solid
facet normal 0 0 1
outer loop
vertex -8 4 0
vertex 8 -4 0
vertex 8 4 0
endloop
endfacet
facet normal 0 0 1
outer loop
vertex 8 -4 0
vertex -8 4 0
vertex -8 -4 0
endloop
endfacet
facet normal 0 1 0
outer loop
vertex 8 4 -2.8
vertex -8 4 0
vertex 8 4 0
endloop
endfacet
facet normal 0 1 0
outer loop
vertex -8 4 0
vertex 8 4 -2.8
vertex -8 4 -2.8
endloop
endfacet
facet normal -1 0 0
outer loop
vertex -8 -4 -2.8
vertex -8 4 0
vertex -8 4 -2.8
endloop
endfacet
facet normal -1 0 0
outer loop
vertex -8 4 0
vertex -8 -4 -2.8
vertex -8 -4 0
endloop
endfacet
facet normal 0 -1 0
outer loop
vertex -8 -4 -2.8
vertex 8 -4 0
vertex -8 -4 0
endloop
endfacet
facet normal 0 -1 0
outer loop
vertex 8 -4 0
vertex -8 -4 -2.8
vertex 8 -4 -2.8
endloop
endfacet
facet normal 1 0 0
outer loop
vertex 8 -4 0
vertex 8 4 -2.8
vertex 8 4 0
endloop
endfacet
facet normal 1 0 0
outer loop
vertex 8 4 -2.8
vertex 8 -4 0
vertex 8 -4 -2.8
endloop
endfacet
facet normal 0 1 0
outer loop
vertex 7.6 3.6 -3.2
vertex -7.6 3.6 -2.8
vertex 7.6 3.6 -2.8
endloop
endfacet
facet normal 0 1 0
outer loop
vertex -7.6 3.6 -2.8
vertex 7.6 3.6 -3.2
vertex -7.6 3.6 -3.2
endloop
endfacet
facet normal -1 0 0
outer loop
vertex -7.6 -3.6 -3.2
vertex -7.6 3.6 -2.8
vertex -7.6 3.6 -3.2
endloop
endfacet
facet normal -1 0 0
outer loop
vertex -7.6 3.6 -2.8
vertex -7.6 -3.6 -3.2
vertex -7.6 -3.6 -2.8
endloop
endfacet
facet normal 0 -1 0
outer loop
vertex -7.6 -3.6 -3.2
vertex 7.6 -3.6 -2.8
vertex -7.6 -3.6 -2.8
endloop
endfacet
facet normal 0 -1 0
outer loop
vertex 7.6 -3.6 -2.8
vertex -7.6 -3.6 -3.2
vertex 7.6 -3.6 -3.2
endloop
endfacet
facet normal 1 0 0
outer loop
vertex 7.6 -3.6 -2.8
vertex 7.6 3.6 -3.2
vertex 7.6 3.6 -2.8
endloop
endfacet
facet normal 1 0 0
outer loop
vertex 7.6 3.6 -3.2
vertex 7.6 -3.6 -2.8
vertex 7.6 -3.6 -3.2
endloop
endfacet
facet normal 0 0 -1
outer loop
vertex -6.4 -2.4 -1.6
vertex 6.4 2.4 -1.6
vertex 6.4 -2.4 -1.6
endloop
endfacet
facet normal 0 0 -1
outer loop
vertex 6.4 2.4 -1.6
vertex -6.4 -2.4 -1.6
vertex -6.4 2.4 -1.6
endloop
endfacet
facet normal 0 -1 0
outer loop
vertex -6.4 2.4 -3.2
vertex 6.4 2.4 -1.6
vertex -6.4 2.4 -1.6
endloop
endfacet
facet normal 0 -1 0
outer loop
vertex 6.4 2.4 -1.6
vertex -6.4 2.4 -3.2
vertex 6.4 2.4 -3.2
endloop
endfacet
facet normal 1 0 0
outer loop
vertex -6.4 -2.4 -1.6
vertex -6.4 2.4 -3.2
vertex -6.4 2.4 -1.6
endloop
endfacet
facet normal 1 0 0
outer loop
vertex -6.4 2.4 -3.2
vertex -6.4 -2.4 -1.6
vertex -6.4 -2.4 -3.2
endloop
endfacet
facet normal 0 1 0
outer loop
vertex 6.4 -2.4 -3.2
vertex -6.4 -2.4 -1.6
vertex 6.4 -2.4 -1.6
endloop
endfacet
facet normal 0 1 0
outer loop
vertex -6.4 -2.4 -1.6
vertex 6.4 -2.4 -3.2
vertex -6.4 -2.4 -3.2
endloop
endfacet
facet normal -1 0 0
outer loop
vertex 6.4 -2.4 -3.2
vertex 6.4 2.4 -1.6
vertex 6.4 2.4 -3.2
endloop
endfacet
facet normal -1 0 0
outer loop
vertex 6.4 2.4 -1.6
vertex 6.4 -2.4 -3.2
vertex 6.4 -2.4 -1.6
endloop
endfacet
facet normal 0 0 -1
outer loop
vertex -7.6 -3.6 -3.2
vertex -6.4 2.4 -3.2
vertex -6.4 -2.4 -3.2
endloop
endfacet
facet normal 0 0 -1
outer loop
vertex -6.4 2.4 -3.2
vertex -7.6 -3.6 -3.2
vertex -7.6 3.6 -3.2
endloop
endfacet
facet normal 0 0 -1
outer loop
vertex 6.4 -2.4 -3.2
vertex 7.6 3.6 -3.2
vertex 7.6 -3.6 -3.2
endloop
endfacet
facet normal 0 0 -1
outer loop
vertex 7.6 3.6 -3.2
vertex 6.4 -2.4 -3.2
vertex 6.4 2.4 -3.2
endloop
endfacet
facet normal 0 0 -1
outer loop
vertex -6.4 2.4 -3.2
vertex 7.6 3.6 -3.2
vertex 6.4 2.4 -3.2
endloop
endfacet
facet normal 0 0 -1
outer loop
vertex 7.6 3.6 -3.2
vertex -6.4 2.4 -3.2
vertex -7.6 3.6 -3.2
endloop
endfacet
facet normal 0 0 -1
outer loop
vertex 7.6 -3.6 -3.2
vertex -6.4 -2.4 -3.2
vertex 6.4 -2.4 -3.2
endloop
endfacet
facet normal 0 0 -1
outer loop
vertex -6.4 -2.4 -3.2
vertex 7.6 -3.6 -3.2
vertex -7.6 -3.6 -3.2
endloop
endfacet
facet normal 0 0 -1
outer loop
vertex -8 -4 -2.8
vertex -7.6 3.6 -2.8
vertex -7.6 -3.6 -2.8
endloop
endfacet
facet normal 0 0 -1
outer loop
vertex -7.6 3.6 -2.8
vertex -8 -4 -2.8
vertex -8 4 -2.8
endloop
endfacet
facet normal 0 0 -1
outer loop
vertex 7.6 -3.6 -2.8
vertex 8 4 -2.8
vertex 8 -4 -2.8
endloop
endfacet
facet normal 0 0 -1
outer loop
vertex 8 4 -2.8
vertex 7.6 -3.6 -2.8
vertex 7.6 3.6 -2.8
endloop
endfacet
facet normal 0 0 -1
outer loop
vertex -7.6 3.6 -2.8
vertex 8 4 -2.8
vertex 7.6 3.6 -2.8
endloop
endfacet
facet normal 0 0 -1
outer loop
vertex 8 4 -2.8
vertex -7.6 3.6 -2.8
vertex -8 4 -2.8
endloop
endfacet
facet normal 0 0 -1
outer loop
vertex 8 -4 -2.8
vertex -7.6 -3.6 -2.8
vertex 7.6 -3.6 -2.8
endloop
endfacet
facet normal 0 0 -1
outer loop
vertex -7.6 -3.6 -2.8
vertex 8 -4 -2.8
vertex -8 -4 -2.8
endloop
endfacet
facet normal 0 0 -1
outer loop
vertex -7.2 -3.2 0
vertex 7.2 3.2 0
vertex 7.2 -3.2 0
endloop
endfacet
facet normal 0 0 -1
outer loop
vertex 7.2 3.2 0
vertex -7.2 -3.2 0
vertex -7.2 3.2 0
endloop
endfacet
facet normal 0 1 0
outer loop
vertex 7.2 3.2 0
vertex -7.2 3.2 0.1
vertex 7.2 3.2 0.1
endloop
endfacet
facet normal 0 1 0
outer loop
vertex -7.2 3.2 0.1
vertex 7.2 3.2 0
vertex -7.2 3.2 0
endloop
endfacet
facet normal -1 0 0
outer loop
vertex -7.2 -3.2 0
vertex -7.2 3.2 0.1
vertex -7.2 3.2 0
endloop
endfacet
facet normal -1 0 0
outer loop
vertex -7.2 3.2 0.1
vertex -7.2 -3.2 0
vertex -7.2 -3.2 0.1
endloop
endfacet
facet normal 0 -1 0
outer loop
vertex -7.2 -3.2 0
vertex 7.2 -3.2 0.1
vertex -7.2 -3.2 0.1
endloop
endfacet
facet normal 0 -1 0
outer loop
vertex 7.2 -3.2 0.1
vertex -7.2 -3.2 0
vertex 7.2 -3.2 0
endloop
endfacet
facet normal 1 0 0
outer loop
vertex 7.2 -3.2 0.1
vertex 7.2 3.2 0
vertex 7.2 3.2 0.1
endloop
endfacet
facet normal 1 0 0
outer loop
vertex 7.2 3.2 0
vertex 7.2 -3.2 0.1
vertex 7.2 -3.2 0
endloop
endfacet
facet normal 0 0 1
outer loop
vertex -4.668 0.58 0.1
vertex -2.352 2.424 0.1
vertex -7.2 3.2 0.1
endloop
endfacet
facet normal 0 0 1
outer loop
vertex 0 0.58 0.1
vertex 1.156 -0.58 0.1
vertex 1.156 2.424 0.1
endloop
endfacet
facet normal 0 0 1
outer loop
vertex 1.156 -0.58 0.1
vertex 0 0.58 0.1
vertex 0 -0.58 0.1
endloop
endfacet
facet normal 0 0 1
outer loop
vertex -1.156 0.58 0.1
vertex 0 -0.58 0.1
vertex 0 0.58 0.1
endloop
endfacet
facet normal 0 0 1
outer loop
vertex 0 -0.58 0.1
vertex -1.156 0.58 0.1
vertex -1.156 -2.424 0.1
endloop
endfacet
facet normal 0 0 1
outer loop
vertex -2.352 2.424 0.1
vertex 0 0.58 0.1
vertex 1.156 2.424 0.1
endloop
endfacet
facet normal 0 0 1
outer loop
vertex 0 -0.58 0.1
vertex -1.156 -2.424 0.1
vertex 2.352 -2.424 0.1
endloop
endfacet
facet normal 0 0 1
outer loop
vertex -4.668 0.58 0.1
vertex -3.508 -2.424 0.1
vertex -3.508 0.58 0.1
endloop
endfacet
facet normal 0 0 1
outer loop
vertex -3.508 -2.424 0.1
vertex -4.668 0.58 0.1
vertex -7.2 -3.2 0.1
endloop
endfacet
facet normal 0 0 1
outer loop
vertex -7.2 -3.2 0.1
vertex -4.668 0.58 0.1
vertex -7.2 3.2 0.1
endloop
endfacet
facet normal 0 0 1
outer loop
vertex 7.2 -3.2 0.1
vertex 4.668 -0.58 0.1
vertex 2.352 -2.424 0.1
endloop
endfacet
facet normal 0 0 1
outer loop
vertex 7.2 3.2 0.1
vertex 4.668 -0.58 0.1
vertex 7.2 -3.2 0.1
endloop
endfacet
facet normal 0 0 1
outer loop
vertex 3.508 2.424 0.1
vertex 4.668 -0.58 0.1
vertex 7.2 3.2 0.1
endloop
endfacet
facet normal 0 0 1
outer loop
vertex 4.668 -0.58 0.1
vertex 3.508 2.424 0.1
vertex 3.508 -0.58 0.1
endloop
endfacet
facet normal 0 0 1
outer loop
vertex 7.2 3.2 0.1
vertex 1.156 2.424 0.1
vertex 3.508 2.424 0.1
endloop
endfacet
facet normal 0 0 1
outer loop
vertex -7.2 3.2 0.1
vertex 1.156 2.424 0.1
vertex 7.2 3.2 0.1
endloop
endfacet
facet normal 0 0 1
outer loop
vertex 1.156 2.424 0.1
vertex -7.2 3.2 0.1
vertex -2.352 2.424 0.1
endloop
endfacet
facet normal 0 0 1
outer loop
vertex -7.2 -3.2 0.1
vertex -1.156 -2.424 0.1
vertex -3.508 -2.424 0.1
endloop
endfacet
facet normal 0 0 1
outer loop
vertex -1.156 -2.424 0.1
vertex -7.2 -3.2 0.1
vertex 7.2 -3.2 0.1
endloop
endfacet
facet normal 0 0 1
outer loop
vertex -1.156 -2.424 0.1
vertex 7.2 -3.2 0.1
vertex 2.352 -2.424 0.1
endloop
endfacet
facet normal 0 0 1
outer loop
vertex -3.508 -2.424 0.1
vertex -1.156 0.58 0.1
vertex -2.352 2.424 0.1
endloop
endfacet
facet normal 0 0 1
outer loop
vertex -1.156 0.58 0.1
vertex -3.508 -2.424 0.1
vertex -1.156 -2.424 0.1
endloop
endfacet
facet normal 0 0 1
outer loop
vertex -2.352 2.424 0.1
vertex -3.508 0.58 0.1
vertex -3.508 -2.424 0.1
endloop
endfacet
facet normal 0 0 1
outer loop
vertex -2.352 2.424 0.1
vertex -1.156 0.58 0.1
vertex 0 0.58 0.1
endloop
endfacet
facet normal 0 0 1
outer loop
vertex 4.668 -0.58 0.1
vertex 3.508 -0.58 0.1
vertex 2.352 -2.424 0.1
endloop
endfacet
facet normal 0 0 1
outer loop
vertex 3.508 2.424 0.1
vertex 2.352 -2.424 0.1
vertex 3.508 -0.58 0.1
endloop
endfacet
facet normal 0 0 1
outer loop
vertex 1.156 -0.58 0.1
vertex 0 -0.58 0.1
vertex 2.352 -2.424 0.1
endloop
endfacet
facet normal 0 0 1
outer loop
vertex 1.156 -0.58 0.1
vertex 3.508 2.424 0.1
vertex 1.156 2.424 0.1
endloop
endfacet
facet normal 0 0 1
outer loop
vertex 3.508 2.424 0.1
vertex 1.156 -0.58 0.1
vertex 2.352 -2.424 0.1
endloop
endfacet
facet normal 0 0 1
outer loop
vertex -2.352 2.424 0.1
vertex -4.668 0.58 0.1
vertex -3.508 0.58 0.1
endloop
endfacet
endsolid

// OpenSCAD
// file: ../p/box5.scad
use <../lib.scad>
function ldraw_lib__box5() = [
// 0 Box with 5 Faces and All Edges
// 0 Name: box5.dat
// 0 Author: James Jessiman
// 0 !LDRAW_ORG Primitive UPDATE 2012-01
// 0 !LICENSE Licensed under CC BY 4.0 : see CAreadme.txt
// 
// 0 BFC CERTIFY CCW
  [0,"BFC","CERTIFY"],
  [0,"BFC","CCW"],
// 
// 0 !HISTORY 2002-04-03 [sbliss] Modified for BFC compliance
// 0 !HISTORY 2002-04-25 [PTadmin] Official Update 2002-02
// 0 !HISTORY 2007-06-24 [PTadmin] Header formatted for Contributor Agreement
// 0 !HISTORY 2008-07-01 [PTadmin] Official Update 2008-01
// 0 !HISTORY 2012-02-16 [Philo] Changed to CCW
// 0 !HISTORY 2012-03-30 [PTadmin] Official Update 2012-01
// 
// 
// 2 24 1 1 1 -1 1 1
  [2,24,1,1,1,-1,1,1],
// 2 24 -1 1 1 -1 1 -1
  [2,24,-1,1,1,-1,1,-1],
// 2 24 -1 1 -1 1 1 -1
  [2,24,-1,1,-1,1,1,-1],
// 2 24 1 1 -1 1 1 1
  [2,24,1,1,-1,1,1,1],
// 2 24 1 0 1 -1 0 1
  [2,24,1,0,1,-1,0,1],
// 2 24 -1 0 1 -1 0 -1
  [2,24,-1,0,1,-1,0,-1],
// 2 24 -1 0 -1 1 0 -1
  [2,24,-1,0,-1,1,0,-1],
// 2 24 1 0 -1 1 0 1
  [2,24,1,0,-1,1,0,1],
// 2 24 1 0 1 1 1 1
  [2,24,1,0,1,1,1,1],
// 2 24 -1 0 1 -1 1 1
  [2,24,-1,0,1,-1,1,1],
// 2 24 1 0 -1 1 1 -1
  [2,24,1,0,-1,1,1,-1],
// 2 24 -1 0 -1 -1 1 -1
  [2,24,-1,0,-1,-1,1,-1],
// 4 16 -1 1 1 1 1 1 1 1 -1 -1 1 -1
  [4,16,-1,1,1,1,1,1,1,1,-1,-1,1,-1],
// 4 16 -1 1 1 -1 0 1 1 0 1 1 1 1
  [4,16,-1,1,1,-1,0,1,1,0,1,1,1,1],
// 4 16 -1 1 -1 -1 0 -1 -1 0 1 -1 1 1
  [4,16,-1,1,-1,-1,0,-1,-1,0,1,-1,1,1],
// 4 16 1 1 -1 1 0 -1 -1 0 -1 -1 1 -1
  [4,16,1,1,-1,1,0,-1,-1,0,-1,-1,1,-1],
// 4 16 1 1 1 1 0 1 1 0 -1 1 1 -1
  [4,16,1,1,1,1,0,1,1,0,-1,1,1,-1],
];
module ldraw_lib__box5(step=0, col=false, unit=2/5, alt=false, line=0.2, solid=!$preview)
    makepoly(ldraw_lib__box5(), step=step, col=col, unit=unit, alt=alt, line=line, solid=solid);
ldraw_lib__box5(line=0.2);
// file: ../p/box4.scad
use <../lib.scad>
function ldraw_lib__box4() = [
// 0 Box with 4 Faces (2 Parallel Pairs) and All Edges
// 0 Name: box4.dat
// 0 Author: James Jessiman
// 0 !LDRAW_ORG Primitive UPDATE 2012-01
// 0 !LICENSE Licensed under CC BY 4.0 : see CAreadme.txt
// 
// 0 BFC CERTIFY CCW
  [0,"BFC","CERTIFY"],
  [0,"BFC","CCW"],
// 
// 0 !HISTORY 2002-04-03 [sbliss] Modified for BFC compliance
// 0 !HISTORY 2002-04-25 [PTadmin] Official Update 2002-02
// 0 !HISTORY 2007-06-24 [PTadmin] Header formatted for Contributor Agreement
// 0 !HISTORY 2008-07-01 [PTadmin] Official Update 2008-01
// 0 !HISTORY 2012-02-16 [Philo] Changed to CCW
// 0 !HISTORY 2012-03-30 [PTadmin] Official Update 2012-01
// 
// 
// 2 24 1 1 1 -1 1 1
  [2,24,1,1,1,-1,1,1],
// 2 24 -1 1 1 -1 1 -1
  [2,24,-1,1,1,-1,1,-1],
// 2 24 -1 1 -1 1 1 -1
  [2,24,-1,1,-1,1,1,-1],
// 2 24 1 1 -1 1 1 1
  [2,24,1,1,-1,1,1,1],
// 2 24 1 0 1 -1 0 1
  [2,24,1,0,1,-1,0,1],
// 2 24 -1 0 1 -1 0 -1
  [2,24,-1,0,1,-1,0,-1],
// 2 24 -1 0 -1 1 0 -1
  [2,24,-1,0,-1,1,0,-1],
// 2 24 1 0 -1 1 0 1
  [2,24,1,0,-1,1,0,1],
// 2 24 1 0 1 1 1 1
  [2,24,1,0,1,1,1,1],
// 2 24 -1 0 1 -1 1 1
  [2,24,-1,0,1,-1,1,1],
// 2 24 1 0 -1 1 1 -1
  [2,24,1,0,-1,1,1,-1],
// 2 24 -1 0 -1 -1 1 -1
  [2,24,-1,0,-1,-1,1,-1],
// 4 16 -1 1 1 -1 0 1 1 0 1 1 1 1
  [4,16,-1,1,1,-1,0,1,1,0,1,1,1,1],
// 4 16 -1 1 -1 -1 0 -1 -1 0 1 -1 1 1
  [4,16,-1,1,-1,-1,0,-1,-1,0,1,-1,1,1],
// 4 16 1 1 -1 1 0 -1 -1 0 -1 -1 1 -1
  [4,16,1,1,-1,1,0,-1,-1,0,-1,-1,1,-1],
// 4 16 1 1 1 1 0 1 1 0 -1 1 1 -1
  [4,16,1,1,1,1,0,1,1,0,-1,1,1,-1],
];
module ldraw_lib__box4(step=0, col=false, unit=2/5, alt=false, line=0.2, solid=!$preview)
    makepoly(ldraw_lib__box4(), step=step, col=col, unit=unit, alt=alt, line=line, solid=solid);
ldraw_lib__box4(line=0.2);
// file: ../p/box5-12.scad
use <../lib.scad>
function ldraw_lib__box5_12() = [
// 0 Box with 5 Faces without Any Edges
// 0 Name: box5-12.dat
// 0 Author: Chris Dee [cwdee]
// 0 !LDRAW_ORG Primitive UPDATE 2009-02
// 0 !LICENSE Licensed under CC BY 4.0 : see CAreadme.txt
// 
// 0 BFC CERTIFY CCW
  [0,"BFC","CERTIFY"],
  [0,"BFC","CCW"],
// 
// 0 !HISTORY 2009-09-03 [PTadmin] Official Update 2009-02
// 
// 
// 4 16 1 1 1 1 1 -1 -1 1 -1 -1 1 1
  [4,16,1,1,1,1,1,-1,-1,1,-1,-1,1,1],
// 4 16 -1 0 1 1 0 1 1 1 1 -1 1 1
  [4,16,-1,0,1,1,0,1,1,1,1,-1,1,1],
// 4 16 -1 0 -1 -1 0 1 -1 1 1 -1 1 -1
  [4,16,-1,0,-1,-1,0,1,-1,1,1,-1,1,-1],
// 4 16 1 0 -1 -1 0 -1 -1 1 -1 1 1 -1
  [4,16,1,0,-1,-1,0,-1,-1,1,-1,1,1,-1],
// 4 16 1 0 1 1 0 -1 1 1 -1 1 1 1
  [4,16,1,0,1,1,0,-1,1,1,-1,1,1,1],
// 0
];
module ldraw_lib__box5_12(step=0, col=false, unit=2/5, alt=false, line=0.2, solid=!$preview)
    makepoly(ldraw_lib__box5_12(), step=step, col=col, unit=unit, alt=alt, line=line, solid=solid);
ldraw_lib__box5_12(line=0.2);
// file: s/3069bs01.scad
use <../../lib.scad>
use <../../p/box4.scad>
use <../../p/box5.scad>
function ldraw_lib__s__3069bs01() = [
// 0 ~Tile  1 x  2 with Groove without Top Face
// 0 Name: s\3069bs01.dat
// 0 Author: Santeri Piippo [arezey]
// 0 !LDRAW_ORG Subpart UPDATE 2010-02
// 0 !LICENSE Licensed under CC BY 4.0 : see CAreadme.txt
// 
// 0 BFC CERTIFY CCW
  [0,"BFC","CERTIFY"],
  [0,"BFC","CCW"],
// 
// 0 !HISTORY 2010-07-05 [PTadmin] Official Update 2010-02
// 
// 
// 1 16 0 0 0 20 0 0 0 7 0 0 0 10 box4.dat
  [1,16,0,0,0,20,0,0,0,7,0,0,0,10, ldraw_lib__box4()],
// 1 16 0 7 0 19 0 0 0 1 0 0 0 9 box4.dat
  [1,16,0,7,0,19,0,0,0,1,0,0,0,9, ldraw_lib__box4()],
// 0 BFC INVERTNEXT
  [0,"BFC","INVERTNEXT"],
// 1 16 0 8 0 16 0 0 0 -4 0 0 0 6 box5.dat
  [1,16,0,8,0,16,0,0,0,-4,0,0,0,6, ldraw_lib__box5()],
// 4 16 -19 8 9 -16 8 6 -16 8 -6 -19 8 -9
  [4,16,-19,8,9,-16,8,6,-16,8,-6,-19,8,-9],
// 4 16 19 8 -9 16 8 -6 16 8 6 19 8 9
  [4,16,19,8,-9,16,8,-6,16,8,6,19,8,9],
// 4 16 19 8 9 16 8 6 -16 8 6 -19 8 9
  [4,16,19,8,9,16,8,6,-16,8,6,-19,8,9],
// 4 16 -19 8 -9 -16 8 -6 16 8 -6 19 8 -9
  [4,16,-19,8,-9,-16,8,-6,16,8,-6,19,8,-9],
// 4 16 -20 7 10 -19 7 9 -19 7 -9 -20 7 -10
  [4,16,-20,7,10,-19,7,9,-19,7,-9,-20,7,-10],
// 4 16 20 7 -10 19 7 -9 19 7 9 20 7 10
  [4,16,20,7,-10,19,7,-9,19,7,9,20,7,10],
// 4 16 20 7 10 19 7 9 -19 7 9 -20 7 10
  [4,16,20,7,10,19,7,9,-19,7,9,-20,7,10],
// 4 16 -20 7 -10 -19 7 -9 19 7 -9 20 7 -10
  [4,16,-20,7,-10,-19,7,-9,19,7,-9,20,7,-10],
// 0 //
];
module ldraw_lib__s__3069bs01(step=0, col=false, unit=2/5, alt=false, line=0.2, solid=!$preview)
    makepoly(ldraw_lib__s__3069bs01(), step=step, col=col, unit=unit, alt=alt, line=line, solid=solid);
ldraw_lib__s__3069bs01(line=0.2);
// file: 821577i.scad
use <../lib.scad>
use <../p/box5-12.scad>
function ldraw_lib__821577i() = [
// 0 Sticker  0.8 x  1.8 with Green Up and Down Arrows
// 0 Name: 821577i.dat
// 0 Author: Evert-Jan Boer [ejboer]
// 0 !LDRAW_ORG Part UPDATE 2026-07
// 0 !LICENSE Licensed under CC BY 4.0 : see CAreadme.txt
// 
// 0 BFC CERTIFY CCW
  [0,"BFC","CERTIFY"],
  [0,"BFC","CCW"],
// 
// 0 !CATEGORY Sticker
// 0 !KEYWORDS Multi Control, Set 8082
// 
// 0 !HISTORY 2026-07-30 [OrionP] Official Update 2026-07
// 
// 1 16 0 -.25 0 18 0 0 0 0.25 0 0 0 8 box5-12.dat
  [1,16,0,-.25,0,18,0,0,0,0.25,0,0,0,8, ldraw_lib__box5_12()],
// 3 16 -11.67 -.25 1.45 -5.88 -.25 6.06 -18 -.25 8
  [3,16,-11.67,-.25,1.45,-5.88,-.25,6.06,-18,-.25,8],
// 4 16 0 -.25 1.45 0 -.25 -1.45 2.89 -.25 -1.45 2.89 -.25 6.06
  [4,16,0,-.25,1.45,0,-.25,-1.45,2.89,-.25,-1.45,2.89,-.25,6.06],
// 4 16 0 -.25 -1.45 0 -.25 1.45 -2.89 -.25 1.45 -2.89 -.25 -6.06
  [4,16,0,-.25,-1.45,0,-.25,1.45,-2.89,-.25,1.45,-2.89,-.25,-6.06],
// 3 16 -5.88 -.25 6.06 0 -.25 1.45 2.89 -.25 6.06
  [3,16,-5.88,-.25,6.06,0,-.25,1.45,2.89,-.25,6.06],
// 3 16 0 -.25 -1.45 -2.89 -.25 -6.06 5.88 -.25 -6.06
  [3,16,0,-.25,-1.45,-2.89,-.25,-6.06,5.88,-.25,-6.06],
// 4 16 -8.77 -.25 -6.06 -8.77 -.25 1.45 -11.67 -.25 1.45 -18 -.25 -8
  [4,16,-8.77,-.25,-6.06,-8.77,-.25,1.45,-11.67,-.25,1.45,-18,-.25,-8],
// 3 16 -18 -.25 -8 -11.67 -.25 1.45 -18 -.25 8
  [3,16,-18,-.25,-8,-11.67,-.25,1.45,-18,-.25,8],
// 3 16 18 -.25 -8 11.67 -.25 -1.45 5.88 -.25 -6.06
  [3,16,18,-.25,-8,11.67,-.25,-1.45,5.88,-.25,-6.06],
// 3 16 18 -.25 8 11.67 -.25 -1.45 18 -.25 -8
  [3,16,18,-.25,8,11.67,-.25,-1.45,18,-.25,-8],
// 4 16 8.77 -.25 6.06 8.77 -.25 -1.45 11.67 -.25 -1.45 18 -.25 8
  [4,16,8.77,-.25,6.06,8.77,-.25,-1.45,11.67,-.25,-1.45,18,-.25,8],
// 3 16 18 -.25 8 2.89 -.25 6.06 8.77 -.25 6.06
  [3,16,18,-.25,8,2.89,-.25,6.06,8.77,-.25,6.06],
// 4 16 -18 -.25 8 -5.88 -.25 6.06 2.89 -.25 6.06 18 -.25 8
  [4,16,-18,-.25,8,-5.88,-.25,6.06,2.89,-.25,6.06,18,-.25,8],
// 4 16 18 -.25 -8 -2.89 -.25 -6.06 -8.77 -.25 -6.06 -18 -.25 -8
  [4,16,18,-.25,-8,-2.89,-.25,-6.06,-8.77,-.25,-6.06,-18,-.25,-8],
// 3 16 -2.89 -.25 -6.06 18 -.25 -8 5.88 -.25 -6.06
  [3,16,-2.89,-.25,-6.06,18,-.25,-8,5.88,-.25,-6.06],
// 
// 0 BFC NOCLIP
  [0,"BFC","NOCLIP"],
// 
// 4 2 -2.89 -.25 -6.06 -2.89 -.25 1.45 -5.88 -.25 6.06 -8.77 -.25 -6.06
  [4,2,-2.89,-.25,-6.06,-2.89,-.25,1.45,-5.88,-.25,6.06,-8.77,-.25,-6.06],
// 3 2 -5.88 -.25 6.06 -8.77 -.25 1.45 -8.77 -.25 -6.06
  [3,2,-5.88,-.25,6.06,-8.77,-.25,1.45,-8.77,-.25,-6.06],
// 3 2 -5.88 -.25 6.06 -2.89 -.25 1.45 0 -.25 1.45
  [3,2,-5.88,-.25,6.06,-2.89,-.25,1.45,0,-.25,1.45],
// 3 2 11.67 -.25 -1.45 8.77 -.25 -1.45 5.88 -.25 -6.06
  [3,2,11.67,-.25,-1.45,8.77,-.25,-1.45,5.88,-.25,-6.06],
// 3 2 8.77 -.25 6.06 5.88 -.25 -6.06 8.77 -.25 -1.45
  [3,2,8.77,-.25,6.06,5.88,-.25,-6.06,8.77,-.25,-1.45],
// 3 2 2.89 -.25 -1.45 0 -.25 -1.45 5.88 -.25 -6.06
  [3,2,2.89,-.25,-1.45,0,-.25,-1.45,5.88,-.25,-6.06],
// 4 2 5.88 -.25 -6.06 8.77 -.25 6.06 2.89 -.25 6.06 2.89 -.25 -1.45
  [4,2,5.88,-.25,-6.06,8.77,-.25,6.06,2.89,-.25,6.06,2.89,-.25,-1.45],
// 3 2 -5.88 -.25 6.06 -11.67 -.25 1.45 -8.77 -.25 1.45
  [3,2,-5.88,-.25,6.06,-11.67,-.25,1.45,-8.77,-.25,1.45],
];
module ldraw_lib__821577i(step=0, col=false, unit=2/5, alt=false, line=0.2, solid=!$preview)
    makepoly(ldraw_lib__821577i(), step=step, col=col, unit=unit, alt=alt, line=line, solid=solid);
ldraw_lib__821577i(line=0.2);
// file: 3069b.scad
use <../lib.scad>
use <s/3069bs01.scad>
function ldraw_lib__3069b() = [
// 0 Tile  1 x  2 with Groove
// 0 Name: 3069b.dat
// 0 Author: Santeri Piippo [arezey]
// 0 !LDRAW_ORG Part UPDATE 2010-02
// 0 !LICENSE Licensed under CC BY 4.0 : see CAreadme.txt
// 
// 0 BFC CERTIFY CCW
  [0,"BFC","CERTIFY"],
  [0,"BFC","CCW"],
// 
// 0 !KEYWORDS BrickLink 3069
// 
// 0 !HISTORY 2010-07-05 [PTadmin] Official Update 2010-02
// 
// 
// 4 16 20 0 -10 20 0 10 -20 0 10 -20 0 -10
  [4,16,20,0,-10,20,0,10,-20,0,10,-20,0,-10],
// 1 16 0 0 0 1 0 0 0 1 0 0 0 1 s\3069bs01.dat
  [1,16,0,0,0,1,0,0,0,1,0,0,0,1, ldraw_lib__s__3069bs01()],
// 0 //
];
module ldraw_lib__3069b(step=0, col=false, unit=2/5, alt=false, line=0.2, solid=!$preview)
    makepoly(ldraw_lib__3069b(), step=step, col=col, unit=unit, alt=alt, line=line, solid=solid);
ldraw_lib__3069b(line=0.2);
// main file
use <../lib.scad>
use <3069b.scad>
use <821577i.scad>
function ldraw_lib__3069bd1y() = [
// 0 Tile  1 x  2 with Green Up and Down Arrows Sticker
// 0 Name: 3069bd1y.dat
// 0 Author: Evert-Jan Boer [ejboer]
// 0 !LDRAW_ORG Shortcut UPDATE 2026-07
// 0 !LICENSE Licensed under CC BY 4.0 : see CAreadme.txt
// 
// 0 BFC CERTIFY CCW
  [0,"BFC","CERTIFY"],
  [0,"BFC","CCW"],
// 
// 0 !CATEGORY Sticker Shortcut
// 0 !KEYWORDS Bricklink 3069pb0099, Set 8082
// 
// 0 !HISTORY 2026-07-30 [OrionP] Official Update 2026-07
// 
// 1 16 0 0 0 1 0 0 0 1 0 0 0 1 3069b.dat
  [1,16,0,0,0,1,0,0,0,1,0,0,0,1, ldraw_lib__3069b()],
// 1 16 0 0 0 1 0 0 0 1 0 0 0 1 821577i.dat
  [1,16,0,0,0,1,0,0,0,1,0,0,0,1, ldraw_lib__821577i()],
];
module ldraw_lib__3069bd1y(step=0, col=false, unit=2/5, alt=false, line=0.2, solid=!$preview)
    makepoly(ldraw_lib__3069bd1y(), step=step, col=col, unit=unit, alt=alt, line=line, solid=solid);
ldraw_lib__3069bd1y(line=0.2);
